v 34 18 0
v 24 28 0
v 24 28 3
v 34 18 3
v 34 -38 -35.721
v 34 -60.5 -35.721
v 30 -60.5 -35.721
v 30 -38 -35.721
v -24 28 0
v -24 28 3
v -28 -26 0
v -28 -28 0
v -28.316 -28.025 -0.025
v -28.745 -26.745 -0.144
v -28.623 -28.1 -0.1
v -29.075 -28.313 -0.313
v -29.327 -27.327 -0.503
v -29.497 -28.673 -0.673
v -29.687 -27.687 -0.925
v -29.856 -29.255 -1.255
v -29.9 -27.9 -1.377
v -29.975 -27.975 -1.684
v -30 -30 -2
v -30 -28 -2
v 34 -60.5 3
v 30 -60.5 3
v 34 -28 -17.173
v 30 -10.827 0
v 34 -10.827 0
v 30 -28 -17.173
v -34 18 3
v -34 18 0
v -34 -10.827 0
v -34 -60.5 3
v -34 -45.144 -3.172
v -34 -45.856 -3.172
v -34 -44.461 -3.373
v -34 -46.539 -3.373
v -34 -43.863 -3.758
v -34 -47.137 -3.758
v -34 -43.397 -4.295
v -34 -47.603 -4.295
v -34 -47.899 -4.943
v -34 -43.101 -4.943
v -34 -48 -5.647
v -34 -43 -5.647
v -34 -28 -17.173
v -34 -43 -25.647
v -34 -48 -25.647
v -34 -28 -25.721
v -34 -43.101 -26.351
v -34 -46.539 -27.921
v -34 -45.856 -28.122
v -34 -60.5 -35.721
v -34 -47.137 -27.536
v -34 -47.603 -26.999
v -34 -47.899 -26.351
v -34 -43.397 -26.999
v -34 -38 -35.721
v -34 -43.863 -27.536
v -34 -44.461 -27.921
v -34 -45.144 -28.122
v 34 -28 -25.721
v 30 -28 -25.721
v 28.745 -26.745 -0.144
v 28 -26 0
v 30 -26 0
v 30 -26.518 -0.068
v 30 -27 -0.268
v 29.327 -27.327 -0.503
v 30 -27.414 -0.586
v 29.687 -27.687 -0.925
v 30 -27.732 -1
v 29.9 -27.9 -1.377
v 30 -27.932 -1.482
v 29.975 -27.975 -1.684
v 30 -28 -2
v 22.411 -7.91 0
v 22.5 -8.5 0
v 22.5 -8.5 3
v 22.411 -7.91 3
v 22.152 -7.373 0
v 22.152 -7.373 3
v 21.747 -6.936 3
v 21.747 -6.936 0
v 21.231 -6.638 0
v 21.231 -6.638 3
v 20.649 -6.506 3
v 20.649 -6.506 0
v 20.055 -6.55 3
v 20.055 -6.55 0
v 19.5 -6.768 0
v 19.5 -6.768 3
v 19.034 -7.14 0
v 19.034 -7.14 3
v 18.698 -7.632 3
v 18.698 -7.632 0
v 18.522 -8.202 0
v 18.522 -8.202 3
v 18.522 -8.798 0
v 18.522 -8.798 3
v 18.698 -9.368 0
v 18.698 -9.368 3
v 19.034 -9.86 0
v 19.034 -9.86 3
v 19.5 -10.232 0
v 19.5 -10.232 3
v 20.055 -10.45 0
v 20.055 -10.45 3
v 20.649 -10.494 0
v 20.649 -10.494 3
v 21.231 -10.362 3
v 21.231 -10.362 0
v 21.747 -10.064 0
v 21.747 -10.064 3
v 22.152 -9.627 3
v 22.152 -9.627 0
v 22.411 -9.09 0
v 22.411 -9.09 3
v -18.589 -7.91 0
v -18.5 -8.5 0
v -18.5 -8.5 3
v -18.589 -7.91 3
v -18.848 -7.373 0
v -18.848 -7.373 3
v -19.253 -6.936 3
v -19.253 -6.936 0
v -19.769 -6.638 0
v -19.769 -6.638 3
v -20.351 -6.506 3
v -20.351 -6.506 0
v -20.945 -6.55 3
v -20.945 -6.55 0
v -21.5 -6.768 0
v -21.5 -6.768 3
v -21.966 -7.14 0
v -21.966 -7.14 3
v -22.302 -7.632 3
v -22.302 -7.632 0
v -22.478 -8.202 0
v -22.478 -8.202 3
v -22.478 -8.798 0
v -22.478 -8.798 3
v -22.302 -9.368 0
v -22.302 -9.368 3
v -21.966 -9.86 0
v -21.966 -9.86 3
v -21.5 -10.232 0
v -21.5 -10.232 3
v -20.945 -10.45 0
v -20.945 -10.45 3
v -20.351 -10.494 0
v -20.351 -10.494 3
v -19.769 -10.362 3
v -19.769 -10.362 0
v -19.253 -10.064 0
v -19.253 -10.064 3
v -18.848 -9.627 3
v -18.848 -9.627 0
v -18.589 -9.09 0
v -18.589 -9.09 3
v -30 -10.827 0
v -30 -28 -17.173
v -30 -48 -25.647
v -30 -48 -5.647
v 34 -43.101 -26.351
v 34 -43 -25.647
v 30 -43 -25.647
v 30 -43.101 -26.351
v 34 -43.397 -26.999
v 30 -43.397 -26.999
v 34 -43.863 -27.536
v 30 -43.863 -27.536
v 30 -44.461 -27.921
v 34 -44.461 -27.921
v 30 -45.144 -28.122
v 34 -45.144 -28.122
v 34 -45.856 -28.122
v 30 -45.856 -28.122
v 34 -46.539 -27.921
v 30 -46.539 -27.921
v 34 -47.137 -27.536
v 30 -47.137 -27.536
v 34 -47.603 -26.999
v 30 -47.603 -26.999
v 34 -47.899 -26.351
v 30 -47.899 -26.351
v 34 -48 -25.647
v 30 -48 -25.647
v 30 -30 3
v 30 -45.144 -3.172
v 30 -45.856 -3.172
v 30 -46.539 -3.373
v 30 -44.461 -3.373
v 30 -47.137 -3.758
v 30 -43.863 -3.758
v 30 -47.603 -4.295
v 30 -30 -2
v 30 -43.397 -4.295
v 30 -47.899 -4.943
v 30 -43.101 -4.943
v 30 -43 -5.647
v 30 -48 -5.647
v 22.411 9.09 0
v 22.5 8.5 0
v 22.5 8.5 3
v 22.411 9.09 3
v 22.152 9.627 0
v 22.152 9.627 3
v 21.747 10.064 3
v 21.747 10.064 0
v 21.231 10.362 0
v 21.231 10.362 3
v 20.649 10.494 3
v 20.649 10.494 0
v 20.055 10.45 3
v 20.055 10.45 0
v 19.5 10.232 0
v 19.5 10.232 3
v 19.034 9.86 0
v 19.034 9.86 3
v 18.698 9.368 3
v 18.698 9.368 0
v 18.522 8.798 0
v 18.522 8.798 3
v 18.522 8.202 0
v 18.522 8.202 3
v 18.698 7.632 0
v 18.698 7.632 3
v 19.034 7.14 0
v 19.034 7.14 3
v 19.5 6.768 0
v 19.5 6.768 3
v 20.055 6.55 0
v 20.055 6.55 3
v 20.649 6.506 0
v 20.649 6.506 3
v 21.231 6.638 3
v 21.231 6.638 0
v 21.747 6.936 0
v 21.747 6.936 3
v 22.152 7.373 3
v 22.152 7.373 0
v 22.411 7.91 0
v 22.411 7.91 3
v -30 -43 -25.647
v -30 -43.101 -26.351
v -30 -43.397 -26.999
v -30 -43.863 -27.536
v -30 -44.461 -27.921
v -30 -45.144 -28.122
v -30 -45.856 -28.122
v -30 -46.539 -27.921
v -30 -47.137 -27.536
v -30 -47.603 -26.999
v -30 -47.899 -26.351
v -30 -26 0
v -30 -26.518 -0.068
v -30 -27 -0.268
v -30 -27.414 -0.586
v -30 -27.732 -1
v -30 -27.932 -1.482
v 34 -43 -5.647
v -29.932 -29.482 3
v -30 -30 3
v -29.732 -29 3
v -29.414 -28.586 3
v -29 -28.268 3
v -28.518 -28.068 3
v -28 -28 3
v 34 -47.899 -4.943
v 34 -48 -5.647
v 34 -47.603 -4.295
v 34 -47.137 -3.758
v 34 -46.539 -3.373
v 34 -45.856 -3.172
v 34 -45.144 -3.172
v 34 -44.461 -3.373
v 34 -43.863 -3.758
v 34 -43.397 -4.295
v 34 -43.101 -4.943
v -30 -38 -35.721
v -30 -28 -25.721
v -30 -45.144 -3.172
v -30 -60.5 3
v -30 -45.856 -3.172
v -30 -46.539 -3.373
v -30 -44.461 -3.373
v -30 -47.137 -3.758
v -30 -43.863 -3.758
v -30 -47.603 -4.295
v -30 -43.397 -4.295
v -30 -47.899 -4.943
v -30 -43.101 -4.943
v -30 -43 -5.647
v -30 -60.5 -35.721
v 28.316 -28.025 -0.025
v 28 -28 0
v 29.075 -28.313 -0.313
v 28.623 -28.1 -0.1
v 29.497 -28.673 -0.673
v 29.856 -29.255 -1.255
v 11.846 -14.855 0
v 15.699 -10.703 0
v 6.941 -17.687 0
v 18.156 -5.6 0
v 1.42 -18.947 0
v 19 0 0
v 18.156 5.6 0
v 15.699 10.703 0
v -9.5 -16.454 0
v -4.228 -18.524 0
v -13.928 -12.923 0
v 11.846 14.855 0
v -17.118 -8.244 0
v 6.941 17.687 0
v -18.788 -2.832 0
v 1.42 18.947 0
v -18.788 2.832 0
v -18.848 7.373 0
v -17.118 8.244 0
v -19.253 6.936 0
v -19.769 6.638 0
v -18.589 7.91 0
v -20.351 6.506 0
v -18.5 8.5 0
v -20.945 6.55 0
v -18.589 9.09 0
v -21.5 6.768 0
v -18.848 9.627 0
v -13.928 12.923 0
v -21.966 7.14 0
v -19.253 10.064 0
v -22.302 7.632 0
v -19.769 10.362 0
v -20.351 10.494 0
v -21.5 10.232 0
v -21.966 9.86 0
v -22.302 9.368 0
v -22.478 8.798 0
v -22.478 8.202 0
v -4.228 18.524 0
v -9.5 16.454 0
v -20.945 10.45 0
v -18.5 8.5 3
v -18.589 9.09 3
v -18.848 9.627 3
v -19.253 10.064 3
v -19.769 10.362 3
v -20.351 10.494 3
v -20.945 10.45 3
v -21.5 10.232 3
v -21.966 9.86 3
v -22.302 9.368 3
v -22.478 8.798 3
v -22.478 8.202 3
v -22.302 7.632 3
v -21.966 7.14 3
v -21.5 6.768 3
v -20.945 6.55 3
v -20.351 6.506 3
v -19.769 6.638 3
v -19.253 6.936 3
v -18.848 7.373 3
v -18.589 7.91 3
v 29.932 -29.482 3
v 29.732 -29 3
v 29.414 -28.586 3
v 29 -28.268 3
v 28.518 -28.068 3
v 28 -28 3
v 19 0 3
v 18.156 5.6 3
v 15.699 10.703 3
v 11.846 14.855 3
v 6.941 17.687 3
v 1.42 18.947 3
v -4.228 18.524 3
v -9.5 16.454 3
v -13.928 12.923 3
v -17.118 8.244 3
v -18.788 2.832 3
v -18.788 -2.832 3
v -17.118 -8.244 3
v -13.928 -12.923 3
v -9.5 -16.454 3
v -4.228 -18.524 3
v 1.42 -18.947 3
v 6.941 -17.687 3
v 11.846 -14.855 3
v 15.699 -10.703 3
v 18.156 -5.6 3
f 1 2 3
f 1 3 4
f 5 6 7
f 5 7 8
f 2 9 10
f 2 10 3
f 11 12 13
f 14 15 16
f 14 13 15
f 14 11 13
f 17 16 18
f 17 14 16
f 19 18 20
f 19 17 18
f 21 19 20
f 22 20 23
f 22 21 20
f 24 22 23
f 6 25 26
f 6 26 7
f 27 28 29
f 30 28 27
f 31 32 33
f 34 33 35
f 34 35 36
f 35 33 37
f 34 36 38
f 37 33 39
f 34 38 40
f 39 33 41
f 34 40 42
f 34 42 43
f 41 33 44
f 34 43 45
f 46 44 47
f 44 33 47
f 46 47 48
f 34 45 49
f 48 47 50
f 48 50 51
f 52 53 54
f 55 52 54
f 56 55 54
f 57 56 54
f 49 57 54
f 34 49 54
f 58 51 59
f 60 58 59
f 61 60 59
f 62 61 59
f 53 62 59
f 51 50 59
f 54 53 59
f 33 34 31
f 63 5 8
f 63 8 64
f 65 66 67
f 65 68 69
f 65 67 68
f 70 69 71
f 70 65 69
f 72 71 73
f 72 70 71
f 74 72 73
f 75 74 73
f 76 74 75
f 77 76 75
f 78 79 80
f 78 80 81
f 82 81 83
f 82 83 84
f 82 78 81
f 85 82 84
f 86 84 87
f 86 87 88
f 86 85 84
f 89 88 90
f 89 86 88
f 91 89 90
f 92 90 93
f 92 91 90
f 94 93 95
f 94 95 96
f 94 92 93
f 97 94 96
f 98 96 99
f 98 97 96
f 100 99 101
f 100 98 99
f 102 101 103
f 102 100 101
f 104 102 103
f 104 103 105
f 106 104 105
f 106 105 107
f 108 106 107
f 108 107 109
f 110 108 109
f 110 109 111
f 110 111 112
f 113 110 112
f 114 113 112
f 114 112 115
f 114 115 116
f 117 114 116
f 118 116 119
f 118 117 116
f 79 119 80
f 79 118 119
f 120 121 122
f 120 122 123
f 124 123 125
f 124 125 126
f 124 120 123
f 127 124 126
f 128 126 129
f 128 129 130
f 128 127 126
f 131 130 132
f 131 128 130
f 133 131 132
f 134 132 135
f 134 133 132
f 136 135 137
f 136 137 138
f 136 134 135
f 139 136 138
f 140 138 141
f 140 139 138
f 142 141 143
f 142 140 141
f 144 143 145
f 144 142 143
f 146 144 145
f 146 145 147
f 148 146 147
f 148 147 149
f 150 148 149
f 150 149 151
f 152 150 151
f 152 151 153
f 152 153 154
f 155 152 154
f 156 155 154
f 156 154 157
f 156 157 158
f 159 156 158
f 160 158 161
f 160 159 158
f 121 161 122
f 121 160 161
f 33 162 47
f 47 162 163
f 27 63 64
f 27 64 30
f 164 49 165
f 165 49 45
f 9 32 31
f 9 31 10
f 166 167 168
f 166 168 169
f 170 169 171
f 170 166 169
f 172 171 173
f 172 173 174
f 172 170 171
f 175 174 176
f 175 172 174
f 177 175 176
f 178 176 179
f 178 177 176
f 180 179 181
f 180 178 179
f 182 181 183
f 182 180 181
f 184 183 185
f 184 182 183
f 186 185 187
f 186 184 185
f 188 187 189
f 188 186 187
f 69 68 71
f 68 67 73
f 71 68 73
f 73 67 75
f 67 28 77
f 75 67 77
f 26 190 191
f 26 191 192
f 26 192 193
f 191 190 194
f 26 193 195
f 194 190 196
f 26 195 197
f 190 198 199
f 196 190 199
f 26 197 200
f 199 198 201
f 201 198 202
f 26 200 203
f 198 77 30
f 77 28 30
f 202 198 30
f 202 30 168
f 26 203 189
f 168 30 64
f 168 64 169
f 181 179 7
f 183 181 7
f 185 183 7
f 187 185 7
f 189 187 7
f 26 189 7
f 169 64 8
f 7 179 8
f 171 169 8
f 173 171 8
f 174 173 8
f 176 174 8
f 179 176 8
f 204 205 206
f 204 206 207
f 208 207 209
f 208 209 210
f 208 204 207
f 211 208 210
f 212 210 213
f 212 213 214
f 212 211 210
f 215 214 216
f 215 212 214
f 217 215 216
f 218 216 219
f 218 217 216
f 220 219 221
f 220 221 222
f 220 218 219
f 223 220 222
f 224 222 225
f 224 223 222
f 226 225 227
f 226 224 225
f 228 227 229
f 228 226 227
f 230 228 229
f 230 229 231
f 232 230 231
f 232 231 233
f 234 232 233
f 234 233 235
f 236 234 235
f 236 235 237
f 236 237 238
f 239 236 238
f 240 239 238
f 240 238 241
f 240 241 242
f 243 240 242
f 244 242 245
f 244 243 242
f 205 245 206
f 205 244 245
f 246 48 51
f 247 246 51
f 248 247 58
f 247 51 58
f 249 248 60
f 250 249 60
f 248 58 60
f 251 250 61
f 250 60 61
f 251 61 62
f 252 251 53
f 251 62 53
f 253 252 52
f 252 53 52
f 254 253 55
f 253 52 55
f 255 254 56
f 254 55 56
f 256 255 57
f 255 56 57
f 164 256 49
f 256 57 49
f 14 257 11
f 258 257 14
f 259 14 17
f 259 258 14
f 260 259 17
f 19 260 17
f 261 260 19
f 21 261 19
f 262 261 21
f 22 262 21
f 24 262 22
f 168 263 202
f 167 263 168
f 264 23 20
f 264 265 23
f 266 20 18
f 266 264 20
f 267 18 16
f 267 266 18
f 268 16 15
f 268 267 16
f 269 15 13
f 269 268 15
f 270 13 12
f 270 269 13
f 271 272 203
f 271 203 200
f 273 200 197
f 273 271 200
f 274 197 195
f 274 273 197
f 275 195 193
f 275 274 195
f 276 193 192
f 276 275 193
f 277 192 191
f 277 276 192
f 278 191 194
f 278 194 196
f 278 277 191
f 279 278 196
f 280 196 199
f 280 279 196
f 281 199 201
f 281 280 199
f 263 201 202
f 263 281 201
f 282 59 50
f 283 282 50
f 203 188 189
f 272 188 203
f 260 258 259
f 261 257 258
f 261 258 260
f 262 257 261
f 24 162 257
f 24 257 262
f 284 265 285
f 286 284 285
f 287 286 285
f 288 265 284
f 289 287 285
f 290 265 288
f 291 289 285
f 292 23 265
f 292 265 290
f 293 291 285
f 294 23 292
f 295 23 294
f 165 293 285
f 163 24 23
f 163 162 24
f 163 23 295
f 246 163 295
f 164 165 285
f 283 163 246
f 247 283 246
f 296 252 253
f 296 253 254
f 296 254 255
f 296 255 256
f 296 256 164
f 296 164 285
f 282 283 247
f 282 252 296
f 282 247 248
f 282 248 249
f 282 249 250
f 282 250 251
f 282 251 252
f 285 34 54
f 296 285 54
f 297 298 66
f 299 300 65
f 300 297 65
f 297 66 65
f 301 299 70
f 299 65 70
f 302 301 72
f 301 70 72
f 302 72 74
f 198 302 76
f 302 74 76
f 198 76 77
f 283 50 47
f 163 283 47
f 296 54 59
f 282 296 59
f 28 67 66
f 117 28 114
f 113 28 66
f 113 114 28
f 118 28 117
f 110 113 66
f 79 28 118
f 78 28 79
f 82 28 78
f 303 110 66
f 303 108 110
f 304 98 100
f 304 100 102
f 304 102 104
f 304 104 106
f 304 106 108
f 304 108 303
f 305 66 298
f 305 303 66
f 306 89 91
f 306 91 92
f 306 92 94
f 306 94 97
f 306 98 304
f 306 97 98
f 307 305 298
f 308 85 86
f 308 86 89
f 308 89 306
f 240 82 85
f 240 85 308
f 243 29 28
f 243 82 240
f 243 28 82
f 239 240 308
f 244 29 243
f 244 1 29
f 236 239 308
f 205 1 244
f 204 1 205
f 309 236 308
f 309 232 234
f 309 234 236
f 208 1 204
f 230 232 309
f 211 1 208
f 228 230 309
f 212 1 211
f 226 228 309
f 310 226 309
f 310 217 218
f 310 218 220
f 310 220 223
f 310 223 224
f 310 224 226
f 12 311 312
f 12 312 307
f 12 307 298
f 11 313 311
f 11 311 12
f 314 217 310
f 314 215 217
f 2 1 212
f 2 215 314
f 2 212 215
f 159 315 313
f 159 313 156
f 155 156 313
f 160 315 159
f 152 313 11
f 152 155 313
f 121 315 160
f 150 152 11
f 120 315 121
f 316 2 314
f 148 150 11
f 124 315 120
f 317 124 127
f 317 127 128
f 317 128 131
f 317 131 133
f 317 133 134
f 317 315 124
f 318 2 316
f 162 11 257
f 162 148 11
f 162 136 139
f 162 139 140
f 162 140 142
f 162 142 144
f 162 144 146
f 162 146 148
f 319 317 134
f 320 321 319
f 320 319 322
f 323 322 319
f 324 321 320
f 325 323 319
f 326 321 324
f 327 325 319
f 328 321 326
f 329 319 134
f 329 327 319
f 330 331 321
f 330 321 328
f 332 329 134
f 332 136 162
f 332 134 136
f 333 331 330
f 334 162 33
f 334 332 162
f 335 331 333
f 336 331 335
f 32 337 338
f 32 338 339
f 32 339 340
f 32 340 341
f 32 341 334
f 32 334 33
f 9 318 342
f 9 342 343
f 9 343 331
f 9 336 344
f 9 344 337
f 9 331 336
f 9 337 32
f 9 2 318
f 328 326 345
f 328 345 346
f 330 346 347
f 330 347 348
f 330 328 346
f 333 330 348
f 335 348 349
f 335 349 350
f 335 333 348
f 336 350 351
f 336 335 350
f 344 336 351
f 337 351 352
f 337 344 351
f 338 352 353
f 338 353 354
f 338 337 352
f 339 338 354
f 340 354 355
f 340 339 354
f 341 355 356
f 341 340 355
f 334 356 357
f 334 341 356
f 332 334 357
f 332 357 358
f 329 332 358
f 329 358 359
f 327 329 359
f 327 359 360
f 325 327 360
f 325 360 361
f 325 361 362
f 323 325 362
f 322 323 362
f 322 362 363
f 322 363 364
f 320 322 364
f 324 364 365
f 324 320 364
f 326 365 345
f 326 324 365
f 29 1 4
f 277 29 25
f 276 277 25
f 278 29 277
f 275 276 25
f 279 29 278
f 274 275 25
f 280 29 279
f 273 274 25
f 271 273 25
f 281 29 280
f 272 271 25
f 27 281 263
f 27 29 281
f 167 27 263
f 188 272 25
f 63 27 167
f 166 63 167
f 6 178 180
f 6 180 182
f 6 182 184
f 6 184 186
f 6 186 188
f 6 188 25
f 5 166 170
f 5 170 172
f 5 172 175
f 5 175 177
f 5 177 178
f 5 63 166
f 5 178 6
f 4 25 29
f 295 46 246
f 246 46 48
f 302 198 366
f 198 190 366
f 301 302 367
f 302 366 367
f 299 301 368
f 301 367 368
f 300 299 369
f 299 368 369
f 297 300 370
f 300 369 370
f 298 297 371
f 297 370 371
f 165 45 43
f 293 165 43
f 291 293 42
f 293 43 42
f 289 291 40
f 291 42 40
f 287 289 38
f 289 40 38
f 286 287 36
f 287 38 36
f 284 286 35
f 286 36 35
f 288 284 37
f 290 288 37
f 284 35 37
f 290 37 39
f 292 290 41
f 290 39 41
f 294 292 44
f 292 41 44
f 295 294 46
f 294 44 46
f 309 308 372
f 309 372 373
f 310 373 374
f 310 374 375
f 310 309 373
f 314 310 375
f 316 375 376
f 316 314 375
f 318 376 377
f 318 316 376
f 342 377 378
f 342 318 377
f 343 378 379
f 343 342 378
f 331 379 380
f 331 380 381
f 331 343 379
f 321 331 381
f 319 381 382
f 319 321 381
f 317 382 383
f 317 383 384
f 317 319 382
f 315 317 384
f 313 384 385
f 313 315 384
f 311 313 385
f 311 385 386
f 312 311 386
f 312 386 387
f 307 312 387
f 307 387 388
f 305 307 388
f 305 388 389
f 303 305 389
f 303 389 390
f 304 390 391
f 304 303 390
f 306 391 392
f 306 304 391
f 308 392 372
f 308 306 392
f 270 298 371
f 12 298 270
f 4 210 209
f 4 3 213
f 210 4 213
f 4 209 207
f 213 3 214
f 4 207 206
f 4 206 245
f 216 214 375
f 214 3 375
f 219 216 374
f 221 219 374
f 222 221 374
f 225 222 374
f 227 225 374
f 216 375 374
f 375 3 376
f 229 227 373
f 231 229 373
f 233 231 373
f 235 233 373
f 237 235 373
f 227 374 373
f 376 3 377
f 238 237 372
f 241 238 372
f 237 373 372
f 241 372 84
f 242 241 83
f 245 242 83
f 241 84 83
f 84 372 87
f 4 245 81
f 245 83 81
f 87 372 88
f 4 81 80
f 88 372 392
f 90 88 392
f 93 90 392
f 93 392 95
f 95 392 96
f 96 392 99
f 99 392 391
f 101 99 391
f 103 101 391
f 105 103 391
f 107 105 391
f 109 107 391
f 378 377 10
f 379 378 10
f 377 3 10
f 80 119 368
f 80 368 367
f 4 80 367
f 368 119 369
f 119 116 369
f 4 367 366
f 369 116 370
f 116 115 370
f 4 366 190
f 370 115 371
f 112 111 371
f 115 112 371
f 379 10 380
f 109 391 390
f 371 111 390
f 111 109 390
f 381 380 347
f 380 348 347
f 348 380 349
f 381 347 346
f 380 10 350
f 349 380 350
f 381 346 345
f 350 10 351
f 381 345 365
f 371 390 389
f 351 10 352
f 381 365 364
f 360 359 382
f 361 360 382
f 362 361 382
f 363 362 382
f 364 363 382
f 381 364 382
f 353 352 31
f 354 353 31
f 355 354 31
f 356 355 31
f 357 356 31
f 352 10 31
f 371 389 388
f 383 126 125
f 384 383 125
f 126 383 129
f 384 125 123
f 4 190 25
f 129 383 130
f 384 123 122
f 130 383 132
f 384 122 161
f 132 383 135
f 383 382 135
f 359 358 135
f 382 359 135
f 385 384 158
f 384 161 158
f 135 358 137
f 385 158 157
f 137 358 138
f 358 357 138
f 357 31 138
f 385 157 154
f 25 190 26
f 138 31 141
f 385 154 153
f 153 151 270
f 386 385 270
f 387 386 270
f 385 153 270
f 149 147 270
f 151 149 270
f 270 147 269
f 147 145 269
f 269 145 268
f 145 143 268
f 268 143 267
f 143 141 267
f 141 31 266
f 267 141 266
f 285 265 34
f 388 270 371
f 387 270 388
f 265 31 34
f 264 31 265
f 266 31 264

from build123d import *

# Parameters (mm, degrees)
SKETCH_1_R             = 2
SKETCH_1_R_2           = 19
EXTRUDE_1_DEPTH        = 3
EXTRUDE_2_DEPTH        = 4
FILLET_3_R             = 2
FILLET_4_R             = 2
FILLET_3_OF_MIRROR_1_R = 2
FILLET_4_OF_MIRROR_1_R = 2
RIB_1_REACH            = 99.776
SKETCH_4_WALL_W        = 221.83912235
SKETCH_4_WALL_H        = 4


with BuildPart() as part:
    # 草图1 → 凸台-拉伸1 (new body)
    with BuildSketch(Plane.XY):
        Polygon((-24, 28), (24, 28), (34, 18), (34, -28), (-34, -28), (-34, 18), align=None)
        with Locations((20.5, -8.5)):
            Circle(SKETCH_1_R, mode=Mode.SUBTRACT)
        with Locations((20.5, 8.5)):
            Circle(SKETCH_1_R, mode=Mode.SUBTRACT)
        with Locations((-20.5, -8.5)):
            Circle(SKETCH_1_R, mode=Mode.SUBTRACT)
        with Locations((-20.5, 8.5)):
            Circle(SKETCH_1_R, mode=Mode.SUBTRACT)
        Circle(SKETCH_1_R_2, mode=Mode.SUBTRACT)
    extrude(amount=EXTRUDE_1_DEPTH)

    # 草图3 → 凸台-拉伸2 (add)
    with BuildSketch(Plane(origin=(34, 0, 0), x_dir=(0, 0, -1), z_dir=(1, 0, 0))):
        Polygon((-3, -28), (-3, -60.5), (35.720694049, -60.5), (35.720694049, -38), (25.720694049, -28), align=None)
        with BuildLine():
            Line((5.647014868, -43), (25.647014868, -43))
            ThreePointArc((25.647014868, -43), (28.147014868, -45.5), (25.647014868, -48))
            Line((25.647014868, -48), (5.647014868, -48))
            ThreePointArc((5.647014868, -48), (3.147014868, -45.5), (5.647014868, -43))
        make_face(mode=Mode.SUBTRACT)
    extrude_2 = extrude(amount=-EXTRUDE_2_DEPTH)

    # 圆角3
    fillet_3_edges = [part.edges().sort_by_distance(p)[0] for p in [
        (32, -28, 0),
    ]]
    fillet(fillet_3_edges, radius=FILLET_3_R)

    # 圆角4
    fillet_4_edges = [part.edges().sort_by_distance(p)[0] for p in [
        (30, -28, 1.5),
        (30, -27, 0),
    ]]
    fillet(fillet_4_edges, radius=FILLET_4_R)

    # 镜向1: 凸台-拉伸2 across plane
    add(extrude_2.mirror(Plane(origin=(0, 0, 0), x_dir=(0, 0, 1), z_dir=(1, 0, 0))))

    # 圆角3 of 镜向1
    fillet_3_of_mirror_1_edges = [part.edges().sort_by_distance(p)[0] for p in [
        (-32, -28, 0),
    ]]
    fillet(fillet_3_of_mirror_1_edges, radius=FILLET_3_OF_MIRROR_1_R)

    # 圆角4 of 镜向1
    fillet_4_of_mirror_1_edges = [part.edges().sort_by_distance(p)[0] for p in [
        (-30, -28, 1.5),
        (-30, -27, 0),
    ]]
    fillet(fillet_4_of_mirror_1_edges, radius=FILLET_4_OF_MIRROR_1_R)

    # 草图4 wall → 筋1 (add, up to next)
    with BuildSketch(Plane(origin=(34, -19.413465197, -8.586534803), x_dir=(0, -0.707106781187, -0.707106781187), z_dir=(0, 0.707106781187, -0.707106781187)), mode=Mode.PRIVATE) as rib_1_sk1:
        with Locations((0, 2)):
            Rectangle(SKETCH_4_WALL_W, SKETCH_4_WALL_H)
    rib_1_tool1 = extrude(rib_1_sk1.sketch, amount=-RIB_1_REACH, mode=Mode.PRIVATE) - part.part
    rib_1 = rib_1_tool1.solids().sort_by_distance((34, -19.413465197, -8.586534803))[0]
    add(rib_1)

    # 镜向2: 筋1 across plane
    add(rib_1.mirror(Plane(origin=(0, 0, 0), x_dir=(0, 0, 1), z_dir=(1, 0, 0))))


solid = part.part
